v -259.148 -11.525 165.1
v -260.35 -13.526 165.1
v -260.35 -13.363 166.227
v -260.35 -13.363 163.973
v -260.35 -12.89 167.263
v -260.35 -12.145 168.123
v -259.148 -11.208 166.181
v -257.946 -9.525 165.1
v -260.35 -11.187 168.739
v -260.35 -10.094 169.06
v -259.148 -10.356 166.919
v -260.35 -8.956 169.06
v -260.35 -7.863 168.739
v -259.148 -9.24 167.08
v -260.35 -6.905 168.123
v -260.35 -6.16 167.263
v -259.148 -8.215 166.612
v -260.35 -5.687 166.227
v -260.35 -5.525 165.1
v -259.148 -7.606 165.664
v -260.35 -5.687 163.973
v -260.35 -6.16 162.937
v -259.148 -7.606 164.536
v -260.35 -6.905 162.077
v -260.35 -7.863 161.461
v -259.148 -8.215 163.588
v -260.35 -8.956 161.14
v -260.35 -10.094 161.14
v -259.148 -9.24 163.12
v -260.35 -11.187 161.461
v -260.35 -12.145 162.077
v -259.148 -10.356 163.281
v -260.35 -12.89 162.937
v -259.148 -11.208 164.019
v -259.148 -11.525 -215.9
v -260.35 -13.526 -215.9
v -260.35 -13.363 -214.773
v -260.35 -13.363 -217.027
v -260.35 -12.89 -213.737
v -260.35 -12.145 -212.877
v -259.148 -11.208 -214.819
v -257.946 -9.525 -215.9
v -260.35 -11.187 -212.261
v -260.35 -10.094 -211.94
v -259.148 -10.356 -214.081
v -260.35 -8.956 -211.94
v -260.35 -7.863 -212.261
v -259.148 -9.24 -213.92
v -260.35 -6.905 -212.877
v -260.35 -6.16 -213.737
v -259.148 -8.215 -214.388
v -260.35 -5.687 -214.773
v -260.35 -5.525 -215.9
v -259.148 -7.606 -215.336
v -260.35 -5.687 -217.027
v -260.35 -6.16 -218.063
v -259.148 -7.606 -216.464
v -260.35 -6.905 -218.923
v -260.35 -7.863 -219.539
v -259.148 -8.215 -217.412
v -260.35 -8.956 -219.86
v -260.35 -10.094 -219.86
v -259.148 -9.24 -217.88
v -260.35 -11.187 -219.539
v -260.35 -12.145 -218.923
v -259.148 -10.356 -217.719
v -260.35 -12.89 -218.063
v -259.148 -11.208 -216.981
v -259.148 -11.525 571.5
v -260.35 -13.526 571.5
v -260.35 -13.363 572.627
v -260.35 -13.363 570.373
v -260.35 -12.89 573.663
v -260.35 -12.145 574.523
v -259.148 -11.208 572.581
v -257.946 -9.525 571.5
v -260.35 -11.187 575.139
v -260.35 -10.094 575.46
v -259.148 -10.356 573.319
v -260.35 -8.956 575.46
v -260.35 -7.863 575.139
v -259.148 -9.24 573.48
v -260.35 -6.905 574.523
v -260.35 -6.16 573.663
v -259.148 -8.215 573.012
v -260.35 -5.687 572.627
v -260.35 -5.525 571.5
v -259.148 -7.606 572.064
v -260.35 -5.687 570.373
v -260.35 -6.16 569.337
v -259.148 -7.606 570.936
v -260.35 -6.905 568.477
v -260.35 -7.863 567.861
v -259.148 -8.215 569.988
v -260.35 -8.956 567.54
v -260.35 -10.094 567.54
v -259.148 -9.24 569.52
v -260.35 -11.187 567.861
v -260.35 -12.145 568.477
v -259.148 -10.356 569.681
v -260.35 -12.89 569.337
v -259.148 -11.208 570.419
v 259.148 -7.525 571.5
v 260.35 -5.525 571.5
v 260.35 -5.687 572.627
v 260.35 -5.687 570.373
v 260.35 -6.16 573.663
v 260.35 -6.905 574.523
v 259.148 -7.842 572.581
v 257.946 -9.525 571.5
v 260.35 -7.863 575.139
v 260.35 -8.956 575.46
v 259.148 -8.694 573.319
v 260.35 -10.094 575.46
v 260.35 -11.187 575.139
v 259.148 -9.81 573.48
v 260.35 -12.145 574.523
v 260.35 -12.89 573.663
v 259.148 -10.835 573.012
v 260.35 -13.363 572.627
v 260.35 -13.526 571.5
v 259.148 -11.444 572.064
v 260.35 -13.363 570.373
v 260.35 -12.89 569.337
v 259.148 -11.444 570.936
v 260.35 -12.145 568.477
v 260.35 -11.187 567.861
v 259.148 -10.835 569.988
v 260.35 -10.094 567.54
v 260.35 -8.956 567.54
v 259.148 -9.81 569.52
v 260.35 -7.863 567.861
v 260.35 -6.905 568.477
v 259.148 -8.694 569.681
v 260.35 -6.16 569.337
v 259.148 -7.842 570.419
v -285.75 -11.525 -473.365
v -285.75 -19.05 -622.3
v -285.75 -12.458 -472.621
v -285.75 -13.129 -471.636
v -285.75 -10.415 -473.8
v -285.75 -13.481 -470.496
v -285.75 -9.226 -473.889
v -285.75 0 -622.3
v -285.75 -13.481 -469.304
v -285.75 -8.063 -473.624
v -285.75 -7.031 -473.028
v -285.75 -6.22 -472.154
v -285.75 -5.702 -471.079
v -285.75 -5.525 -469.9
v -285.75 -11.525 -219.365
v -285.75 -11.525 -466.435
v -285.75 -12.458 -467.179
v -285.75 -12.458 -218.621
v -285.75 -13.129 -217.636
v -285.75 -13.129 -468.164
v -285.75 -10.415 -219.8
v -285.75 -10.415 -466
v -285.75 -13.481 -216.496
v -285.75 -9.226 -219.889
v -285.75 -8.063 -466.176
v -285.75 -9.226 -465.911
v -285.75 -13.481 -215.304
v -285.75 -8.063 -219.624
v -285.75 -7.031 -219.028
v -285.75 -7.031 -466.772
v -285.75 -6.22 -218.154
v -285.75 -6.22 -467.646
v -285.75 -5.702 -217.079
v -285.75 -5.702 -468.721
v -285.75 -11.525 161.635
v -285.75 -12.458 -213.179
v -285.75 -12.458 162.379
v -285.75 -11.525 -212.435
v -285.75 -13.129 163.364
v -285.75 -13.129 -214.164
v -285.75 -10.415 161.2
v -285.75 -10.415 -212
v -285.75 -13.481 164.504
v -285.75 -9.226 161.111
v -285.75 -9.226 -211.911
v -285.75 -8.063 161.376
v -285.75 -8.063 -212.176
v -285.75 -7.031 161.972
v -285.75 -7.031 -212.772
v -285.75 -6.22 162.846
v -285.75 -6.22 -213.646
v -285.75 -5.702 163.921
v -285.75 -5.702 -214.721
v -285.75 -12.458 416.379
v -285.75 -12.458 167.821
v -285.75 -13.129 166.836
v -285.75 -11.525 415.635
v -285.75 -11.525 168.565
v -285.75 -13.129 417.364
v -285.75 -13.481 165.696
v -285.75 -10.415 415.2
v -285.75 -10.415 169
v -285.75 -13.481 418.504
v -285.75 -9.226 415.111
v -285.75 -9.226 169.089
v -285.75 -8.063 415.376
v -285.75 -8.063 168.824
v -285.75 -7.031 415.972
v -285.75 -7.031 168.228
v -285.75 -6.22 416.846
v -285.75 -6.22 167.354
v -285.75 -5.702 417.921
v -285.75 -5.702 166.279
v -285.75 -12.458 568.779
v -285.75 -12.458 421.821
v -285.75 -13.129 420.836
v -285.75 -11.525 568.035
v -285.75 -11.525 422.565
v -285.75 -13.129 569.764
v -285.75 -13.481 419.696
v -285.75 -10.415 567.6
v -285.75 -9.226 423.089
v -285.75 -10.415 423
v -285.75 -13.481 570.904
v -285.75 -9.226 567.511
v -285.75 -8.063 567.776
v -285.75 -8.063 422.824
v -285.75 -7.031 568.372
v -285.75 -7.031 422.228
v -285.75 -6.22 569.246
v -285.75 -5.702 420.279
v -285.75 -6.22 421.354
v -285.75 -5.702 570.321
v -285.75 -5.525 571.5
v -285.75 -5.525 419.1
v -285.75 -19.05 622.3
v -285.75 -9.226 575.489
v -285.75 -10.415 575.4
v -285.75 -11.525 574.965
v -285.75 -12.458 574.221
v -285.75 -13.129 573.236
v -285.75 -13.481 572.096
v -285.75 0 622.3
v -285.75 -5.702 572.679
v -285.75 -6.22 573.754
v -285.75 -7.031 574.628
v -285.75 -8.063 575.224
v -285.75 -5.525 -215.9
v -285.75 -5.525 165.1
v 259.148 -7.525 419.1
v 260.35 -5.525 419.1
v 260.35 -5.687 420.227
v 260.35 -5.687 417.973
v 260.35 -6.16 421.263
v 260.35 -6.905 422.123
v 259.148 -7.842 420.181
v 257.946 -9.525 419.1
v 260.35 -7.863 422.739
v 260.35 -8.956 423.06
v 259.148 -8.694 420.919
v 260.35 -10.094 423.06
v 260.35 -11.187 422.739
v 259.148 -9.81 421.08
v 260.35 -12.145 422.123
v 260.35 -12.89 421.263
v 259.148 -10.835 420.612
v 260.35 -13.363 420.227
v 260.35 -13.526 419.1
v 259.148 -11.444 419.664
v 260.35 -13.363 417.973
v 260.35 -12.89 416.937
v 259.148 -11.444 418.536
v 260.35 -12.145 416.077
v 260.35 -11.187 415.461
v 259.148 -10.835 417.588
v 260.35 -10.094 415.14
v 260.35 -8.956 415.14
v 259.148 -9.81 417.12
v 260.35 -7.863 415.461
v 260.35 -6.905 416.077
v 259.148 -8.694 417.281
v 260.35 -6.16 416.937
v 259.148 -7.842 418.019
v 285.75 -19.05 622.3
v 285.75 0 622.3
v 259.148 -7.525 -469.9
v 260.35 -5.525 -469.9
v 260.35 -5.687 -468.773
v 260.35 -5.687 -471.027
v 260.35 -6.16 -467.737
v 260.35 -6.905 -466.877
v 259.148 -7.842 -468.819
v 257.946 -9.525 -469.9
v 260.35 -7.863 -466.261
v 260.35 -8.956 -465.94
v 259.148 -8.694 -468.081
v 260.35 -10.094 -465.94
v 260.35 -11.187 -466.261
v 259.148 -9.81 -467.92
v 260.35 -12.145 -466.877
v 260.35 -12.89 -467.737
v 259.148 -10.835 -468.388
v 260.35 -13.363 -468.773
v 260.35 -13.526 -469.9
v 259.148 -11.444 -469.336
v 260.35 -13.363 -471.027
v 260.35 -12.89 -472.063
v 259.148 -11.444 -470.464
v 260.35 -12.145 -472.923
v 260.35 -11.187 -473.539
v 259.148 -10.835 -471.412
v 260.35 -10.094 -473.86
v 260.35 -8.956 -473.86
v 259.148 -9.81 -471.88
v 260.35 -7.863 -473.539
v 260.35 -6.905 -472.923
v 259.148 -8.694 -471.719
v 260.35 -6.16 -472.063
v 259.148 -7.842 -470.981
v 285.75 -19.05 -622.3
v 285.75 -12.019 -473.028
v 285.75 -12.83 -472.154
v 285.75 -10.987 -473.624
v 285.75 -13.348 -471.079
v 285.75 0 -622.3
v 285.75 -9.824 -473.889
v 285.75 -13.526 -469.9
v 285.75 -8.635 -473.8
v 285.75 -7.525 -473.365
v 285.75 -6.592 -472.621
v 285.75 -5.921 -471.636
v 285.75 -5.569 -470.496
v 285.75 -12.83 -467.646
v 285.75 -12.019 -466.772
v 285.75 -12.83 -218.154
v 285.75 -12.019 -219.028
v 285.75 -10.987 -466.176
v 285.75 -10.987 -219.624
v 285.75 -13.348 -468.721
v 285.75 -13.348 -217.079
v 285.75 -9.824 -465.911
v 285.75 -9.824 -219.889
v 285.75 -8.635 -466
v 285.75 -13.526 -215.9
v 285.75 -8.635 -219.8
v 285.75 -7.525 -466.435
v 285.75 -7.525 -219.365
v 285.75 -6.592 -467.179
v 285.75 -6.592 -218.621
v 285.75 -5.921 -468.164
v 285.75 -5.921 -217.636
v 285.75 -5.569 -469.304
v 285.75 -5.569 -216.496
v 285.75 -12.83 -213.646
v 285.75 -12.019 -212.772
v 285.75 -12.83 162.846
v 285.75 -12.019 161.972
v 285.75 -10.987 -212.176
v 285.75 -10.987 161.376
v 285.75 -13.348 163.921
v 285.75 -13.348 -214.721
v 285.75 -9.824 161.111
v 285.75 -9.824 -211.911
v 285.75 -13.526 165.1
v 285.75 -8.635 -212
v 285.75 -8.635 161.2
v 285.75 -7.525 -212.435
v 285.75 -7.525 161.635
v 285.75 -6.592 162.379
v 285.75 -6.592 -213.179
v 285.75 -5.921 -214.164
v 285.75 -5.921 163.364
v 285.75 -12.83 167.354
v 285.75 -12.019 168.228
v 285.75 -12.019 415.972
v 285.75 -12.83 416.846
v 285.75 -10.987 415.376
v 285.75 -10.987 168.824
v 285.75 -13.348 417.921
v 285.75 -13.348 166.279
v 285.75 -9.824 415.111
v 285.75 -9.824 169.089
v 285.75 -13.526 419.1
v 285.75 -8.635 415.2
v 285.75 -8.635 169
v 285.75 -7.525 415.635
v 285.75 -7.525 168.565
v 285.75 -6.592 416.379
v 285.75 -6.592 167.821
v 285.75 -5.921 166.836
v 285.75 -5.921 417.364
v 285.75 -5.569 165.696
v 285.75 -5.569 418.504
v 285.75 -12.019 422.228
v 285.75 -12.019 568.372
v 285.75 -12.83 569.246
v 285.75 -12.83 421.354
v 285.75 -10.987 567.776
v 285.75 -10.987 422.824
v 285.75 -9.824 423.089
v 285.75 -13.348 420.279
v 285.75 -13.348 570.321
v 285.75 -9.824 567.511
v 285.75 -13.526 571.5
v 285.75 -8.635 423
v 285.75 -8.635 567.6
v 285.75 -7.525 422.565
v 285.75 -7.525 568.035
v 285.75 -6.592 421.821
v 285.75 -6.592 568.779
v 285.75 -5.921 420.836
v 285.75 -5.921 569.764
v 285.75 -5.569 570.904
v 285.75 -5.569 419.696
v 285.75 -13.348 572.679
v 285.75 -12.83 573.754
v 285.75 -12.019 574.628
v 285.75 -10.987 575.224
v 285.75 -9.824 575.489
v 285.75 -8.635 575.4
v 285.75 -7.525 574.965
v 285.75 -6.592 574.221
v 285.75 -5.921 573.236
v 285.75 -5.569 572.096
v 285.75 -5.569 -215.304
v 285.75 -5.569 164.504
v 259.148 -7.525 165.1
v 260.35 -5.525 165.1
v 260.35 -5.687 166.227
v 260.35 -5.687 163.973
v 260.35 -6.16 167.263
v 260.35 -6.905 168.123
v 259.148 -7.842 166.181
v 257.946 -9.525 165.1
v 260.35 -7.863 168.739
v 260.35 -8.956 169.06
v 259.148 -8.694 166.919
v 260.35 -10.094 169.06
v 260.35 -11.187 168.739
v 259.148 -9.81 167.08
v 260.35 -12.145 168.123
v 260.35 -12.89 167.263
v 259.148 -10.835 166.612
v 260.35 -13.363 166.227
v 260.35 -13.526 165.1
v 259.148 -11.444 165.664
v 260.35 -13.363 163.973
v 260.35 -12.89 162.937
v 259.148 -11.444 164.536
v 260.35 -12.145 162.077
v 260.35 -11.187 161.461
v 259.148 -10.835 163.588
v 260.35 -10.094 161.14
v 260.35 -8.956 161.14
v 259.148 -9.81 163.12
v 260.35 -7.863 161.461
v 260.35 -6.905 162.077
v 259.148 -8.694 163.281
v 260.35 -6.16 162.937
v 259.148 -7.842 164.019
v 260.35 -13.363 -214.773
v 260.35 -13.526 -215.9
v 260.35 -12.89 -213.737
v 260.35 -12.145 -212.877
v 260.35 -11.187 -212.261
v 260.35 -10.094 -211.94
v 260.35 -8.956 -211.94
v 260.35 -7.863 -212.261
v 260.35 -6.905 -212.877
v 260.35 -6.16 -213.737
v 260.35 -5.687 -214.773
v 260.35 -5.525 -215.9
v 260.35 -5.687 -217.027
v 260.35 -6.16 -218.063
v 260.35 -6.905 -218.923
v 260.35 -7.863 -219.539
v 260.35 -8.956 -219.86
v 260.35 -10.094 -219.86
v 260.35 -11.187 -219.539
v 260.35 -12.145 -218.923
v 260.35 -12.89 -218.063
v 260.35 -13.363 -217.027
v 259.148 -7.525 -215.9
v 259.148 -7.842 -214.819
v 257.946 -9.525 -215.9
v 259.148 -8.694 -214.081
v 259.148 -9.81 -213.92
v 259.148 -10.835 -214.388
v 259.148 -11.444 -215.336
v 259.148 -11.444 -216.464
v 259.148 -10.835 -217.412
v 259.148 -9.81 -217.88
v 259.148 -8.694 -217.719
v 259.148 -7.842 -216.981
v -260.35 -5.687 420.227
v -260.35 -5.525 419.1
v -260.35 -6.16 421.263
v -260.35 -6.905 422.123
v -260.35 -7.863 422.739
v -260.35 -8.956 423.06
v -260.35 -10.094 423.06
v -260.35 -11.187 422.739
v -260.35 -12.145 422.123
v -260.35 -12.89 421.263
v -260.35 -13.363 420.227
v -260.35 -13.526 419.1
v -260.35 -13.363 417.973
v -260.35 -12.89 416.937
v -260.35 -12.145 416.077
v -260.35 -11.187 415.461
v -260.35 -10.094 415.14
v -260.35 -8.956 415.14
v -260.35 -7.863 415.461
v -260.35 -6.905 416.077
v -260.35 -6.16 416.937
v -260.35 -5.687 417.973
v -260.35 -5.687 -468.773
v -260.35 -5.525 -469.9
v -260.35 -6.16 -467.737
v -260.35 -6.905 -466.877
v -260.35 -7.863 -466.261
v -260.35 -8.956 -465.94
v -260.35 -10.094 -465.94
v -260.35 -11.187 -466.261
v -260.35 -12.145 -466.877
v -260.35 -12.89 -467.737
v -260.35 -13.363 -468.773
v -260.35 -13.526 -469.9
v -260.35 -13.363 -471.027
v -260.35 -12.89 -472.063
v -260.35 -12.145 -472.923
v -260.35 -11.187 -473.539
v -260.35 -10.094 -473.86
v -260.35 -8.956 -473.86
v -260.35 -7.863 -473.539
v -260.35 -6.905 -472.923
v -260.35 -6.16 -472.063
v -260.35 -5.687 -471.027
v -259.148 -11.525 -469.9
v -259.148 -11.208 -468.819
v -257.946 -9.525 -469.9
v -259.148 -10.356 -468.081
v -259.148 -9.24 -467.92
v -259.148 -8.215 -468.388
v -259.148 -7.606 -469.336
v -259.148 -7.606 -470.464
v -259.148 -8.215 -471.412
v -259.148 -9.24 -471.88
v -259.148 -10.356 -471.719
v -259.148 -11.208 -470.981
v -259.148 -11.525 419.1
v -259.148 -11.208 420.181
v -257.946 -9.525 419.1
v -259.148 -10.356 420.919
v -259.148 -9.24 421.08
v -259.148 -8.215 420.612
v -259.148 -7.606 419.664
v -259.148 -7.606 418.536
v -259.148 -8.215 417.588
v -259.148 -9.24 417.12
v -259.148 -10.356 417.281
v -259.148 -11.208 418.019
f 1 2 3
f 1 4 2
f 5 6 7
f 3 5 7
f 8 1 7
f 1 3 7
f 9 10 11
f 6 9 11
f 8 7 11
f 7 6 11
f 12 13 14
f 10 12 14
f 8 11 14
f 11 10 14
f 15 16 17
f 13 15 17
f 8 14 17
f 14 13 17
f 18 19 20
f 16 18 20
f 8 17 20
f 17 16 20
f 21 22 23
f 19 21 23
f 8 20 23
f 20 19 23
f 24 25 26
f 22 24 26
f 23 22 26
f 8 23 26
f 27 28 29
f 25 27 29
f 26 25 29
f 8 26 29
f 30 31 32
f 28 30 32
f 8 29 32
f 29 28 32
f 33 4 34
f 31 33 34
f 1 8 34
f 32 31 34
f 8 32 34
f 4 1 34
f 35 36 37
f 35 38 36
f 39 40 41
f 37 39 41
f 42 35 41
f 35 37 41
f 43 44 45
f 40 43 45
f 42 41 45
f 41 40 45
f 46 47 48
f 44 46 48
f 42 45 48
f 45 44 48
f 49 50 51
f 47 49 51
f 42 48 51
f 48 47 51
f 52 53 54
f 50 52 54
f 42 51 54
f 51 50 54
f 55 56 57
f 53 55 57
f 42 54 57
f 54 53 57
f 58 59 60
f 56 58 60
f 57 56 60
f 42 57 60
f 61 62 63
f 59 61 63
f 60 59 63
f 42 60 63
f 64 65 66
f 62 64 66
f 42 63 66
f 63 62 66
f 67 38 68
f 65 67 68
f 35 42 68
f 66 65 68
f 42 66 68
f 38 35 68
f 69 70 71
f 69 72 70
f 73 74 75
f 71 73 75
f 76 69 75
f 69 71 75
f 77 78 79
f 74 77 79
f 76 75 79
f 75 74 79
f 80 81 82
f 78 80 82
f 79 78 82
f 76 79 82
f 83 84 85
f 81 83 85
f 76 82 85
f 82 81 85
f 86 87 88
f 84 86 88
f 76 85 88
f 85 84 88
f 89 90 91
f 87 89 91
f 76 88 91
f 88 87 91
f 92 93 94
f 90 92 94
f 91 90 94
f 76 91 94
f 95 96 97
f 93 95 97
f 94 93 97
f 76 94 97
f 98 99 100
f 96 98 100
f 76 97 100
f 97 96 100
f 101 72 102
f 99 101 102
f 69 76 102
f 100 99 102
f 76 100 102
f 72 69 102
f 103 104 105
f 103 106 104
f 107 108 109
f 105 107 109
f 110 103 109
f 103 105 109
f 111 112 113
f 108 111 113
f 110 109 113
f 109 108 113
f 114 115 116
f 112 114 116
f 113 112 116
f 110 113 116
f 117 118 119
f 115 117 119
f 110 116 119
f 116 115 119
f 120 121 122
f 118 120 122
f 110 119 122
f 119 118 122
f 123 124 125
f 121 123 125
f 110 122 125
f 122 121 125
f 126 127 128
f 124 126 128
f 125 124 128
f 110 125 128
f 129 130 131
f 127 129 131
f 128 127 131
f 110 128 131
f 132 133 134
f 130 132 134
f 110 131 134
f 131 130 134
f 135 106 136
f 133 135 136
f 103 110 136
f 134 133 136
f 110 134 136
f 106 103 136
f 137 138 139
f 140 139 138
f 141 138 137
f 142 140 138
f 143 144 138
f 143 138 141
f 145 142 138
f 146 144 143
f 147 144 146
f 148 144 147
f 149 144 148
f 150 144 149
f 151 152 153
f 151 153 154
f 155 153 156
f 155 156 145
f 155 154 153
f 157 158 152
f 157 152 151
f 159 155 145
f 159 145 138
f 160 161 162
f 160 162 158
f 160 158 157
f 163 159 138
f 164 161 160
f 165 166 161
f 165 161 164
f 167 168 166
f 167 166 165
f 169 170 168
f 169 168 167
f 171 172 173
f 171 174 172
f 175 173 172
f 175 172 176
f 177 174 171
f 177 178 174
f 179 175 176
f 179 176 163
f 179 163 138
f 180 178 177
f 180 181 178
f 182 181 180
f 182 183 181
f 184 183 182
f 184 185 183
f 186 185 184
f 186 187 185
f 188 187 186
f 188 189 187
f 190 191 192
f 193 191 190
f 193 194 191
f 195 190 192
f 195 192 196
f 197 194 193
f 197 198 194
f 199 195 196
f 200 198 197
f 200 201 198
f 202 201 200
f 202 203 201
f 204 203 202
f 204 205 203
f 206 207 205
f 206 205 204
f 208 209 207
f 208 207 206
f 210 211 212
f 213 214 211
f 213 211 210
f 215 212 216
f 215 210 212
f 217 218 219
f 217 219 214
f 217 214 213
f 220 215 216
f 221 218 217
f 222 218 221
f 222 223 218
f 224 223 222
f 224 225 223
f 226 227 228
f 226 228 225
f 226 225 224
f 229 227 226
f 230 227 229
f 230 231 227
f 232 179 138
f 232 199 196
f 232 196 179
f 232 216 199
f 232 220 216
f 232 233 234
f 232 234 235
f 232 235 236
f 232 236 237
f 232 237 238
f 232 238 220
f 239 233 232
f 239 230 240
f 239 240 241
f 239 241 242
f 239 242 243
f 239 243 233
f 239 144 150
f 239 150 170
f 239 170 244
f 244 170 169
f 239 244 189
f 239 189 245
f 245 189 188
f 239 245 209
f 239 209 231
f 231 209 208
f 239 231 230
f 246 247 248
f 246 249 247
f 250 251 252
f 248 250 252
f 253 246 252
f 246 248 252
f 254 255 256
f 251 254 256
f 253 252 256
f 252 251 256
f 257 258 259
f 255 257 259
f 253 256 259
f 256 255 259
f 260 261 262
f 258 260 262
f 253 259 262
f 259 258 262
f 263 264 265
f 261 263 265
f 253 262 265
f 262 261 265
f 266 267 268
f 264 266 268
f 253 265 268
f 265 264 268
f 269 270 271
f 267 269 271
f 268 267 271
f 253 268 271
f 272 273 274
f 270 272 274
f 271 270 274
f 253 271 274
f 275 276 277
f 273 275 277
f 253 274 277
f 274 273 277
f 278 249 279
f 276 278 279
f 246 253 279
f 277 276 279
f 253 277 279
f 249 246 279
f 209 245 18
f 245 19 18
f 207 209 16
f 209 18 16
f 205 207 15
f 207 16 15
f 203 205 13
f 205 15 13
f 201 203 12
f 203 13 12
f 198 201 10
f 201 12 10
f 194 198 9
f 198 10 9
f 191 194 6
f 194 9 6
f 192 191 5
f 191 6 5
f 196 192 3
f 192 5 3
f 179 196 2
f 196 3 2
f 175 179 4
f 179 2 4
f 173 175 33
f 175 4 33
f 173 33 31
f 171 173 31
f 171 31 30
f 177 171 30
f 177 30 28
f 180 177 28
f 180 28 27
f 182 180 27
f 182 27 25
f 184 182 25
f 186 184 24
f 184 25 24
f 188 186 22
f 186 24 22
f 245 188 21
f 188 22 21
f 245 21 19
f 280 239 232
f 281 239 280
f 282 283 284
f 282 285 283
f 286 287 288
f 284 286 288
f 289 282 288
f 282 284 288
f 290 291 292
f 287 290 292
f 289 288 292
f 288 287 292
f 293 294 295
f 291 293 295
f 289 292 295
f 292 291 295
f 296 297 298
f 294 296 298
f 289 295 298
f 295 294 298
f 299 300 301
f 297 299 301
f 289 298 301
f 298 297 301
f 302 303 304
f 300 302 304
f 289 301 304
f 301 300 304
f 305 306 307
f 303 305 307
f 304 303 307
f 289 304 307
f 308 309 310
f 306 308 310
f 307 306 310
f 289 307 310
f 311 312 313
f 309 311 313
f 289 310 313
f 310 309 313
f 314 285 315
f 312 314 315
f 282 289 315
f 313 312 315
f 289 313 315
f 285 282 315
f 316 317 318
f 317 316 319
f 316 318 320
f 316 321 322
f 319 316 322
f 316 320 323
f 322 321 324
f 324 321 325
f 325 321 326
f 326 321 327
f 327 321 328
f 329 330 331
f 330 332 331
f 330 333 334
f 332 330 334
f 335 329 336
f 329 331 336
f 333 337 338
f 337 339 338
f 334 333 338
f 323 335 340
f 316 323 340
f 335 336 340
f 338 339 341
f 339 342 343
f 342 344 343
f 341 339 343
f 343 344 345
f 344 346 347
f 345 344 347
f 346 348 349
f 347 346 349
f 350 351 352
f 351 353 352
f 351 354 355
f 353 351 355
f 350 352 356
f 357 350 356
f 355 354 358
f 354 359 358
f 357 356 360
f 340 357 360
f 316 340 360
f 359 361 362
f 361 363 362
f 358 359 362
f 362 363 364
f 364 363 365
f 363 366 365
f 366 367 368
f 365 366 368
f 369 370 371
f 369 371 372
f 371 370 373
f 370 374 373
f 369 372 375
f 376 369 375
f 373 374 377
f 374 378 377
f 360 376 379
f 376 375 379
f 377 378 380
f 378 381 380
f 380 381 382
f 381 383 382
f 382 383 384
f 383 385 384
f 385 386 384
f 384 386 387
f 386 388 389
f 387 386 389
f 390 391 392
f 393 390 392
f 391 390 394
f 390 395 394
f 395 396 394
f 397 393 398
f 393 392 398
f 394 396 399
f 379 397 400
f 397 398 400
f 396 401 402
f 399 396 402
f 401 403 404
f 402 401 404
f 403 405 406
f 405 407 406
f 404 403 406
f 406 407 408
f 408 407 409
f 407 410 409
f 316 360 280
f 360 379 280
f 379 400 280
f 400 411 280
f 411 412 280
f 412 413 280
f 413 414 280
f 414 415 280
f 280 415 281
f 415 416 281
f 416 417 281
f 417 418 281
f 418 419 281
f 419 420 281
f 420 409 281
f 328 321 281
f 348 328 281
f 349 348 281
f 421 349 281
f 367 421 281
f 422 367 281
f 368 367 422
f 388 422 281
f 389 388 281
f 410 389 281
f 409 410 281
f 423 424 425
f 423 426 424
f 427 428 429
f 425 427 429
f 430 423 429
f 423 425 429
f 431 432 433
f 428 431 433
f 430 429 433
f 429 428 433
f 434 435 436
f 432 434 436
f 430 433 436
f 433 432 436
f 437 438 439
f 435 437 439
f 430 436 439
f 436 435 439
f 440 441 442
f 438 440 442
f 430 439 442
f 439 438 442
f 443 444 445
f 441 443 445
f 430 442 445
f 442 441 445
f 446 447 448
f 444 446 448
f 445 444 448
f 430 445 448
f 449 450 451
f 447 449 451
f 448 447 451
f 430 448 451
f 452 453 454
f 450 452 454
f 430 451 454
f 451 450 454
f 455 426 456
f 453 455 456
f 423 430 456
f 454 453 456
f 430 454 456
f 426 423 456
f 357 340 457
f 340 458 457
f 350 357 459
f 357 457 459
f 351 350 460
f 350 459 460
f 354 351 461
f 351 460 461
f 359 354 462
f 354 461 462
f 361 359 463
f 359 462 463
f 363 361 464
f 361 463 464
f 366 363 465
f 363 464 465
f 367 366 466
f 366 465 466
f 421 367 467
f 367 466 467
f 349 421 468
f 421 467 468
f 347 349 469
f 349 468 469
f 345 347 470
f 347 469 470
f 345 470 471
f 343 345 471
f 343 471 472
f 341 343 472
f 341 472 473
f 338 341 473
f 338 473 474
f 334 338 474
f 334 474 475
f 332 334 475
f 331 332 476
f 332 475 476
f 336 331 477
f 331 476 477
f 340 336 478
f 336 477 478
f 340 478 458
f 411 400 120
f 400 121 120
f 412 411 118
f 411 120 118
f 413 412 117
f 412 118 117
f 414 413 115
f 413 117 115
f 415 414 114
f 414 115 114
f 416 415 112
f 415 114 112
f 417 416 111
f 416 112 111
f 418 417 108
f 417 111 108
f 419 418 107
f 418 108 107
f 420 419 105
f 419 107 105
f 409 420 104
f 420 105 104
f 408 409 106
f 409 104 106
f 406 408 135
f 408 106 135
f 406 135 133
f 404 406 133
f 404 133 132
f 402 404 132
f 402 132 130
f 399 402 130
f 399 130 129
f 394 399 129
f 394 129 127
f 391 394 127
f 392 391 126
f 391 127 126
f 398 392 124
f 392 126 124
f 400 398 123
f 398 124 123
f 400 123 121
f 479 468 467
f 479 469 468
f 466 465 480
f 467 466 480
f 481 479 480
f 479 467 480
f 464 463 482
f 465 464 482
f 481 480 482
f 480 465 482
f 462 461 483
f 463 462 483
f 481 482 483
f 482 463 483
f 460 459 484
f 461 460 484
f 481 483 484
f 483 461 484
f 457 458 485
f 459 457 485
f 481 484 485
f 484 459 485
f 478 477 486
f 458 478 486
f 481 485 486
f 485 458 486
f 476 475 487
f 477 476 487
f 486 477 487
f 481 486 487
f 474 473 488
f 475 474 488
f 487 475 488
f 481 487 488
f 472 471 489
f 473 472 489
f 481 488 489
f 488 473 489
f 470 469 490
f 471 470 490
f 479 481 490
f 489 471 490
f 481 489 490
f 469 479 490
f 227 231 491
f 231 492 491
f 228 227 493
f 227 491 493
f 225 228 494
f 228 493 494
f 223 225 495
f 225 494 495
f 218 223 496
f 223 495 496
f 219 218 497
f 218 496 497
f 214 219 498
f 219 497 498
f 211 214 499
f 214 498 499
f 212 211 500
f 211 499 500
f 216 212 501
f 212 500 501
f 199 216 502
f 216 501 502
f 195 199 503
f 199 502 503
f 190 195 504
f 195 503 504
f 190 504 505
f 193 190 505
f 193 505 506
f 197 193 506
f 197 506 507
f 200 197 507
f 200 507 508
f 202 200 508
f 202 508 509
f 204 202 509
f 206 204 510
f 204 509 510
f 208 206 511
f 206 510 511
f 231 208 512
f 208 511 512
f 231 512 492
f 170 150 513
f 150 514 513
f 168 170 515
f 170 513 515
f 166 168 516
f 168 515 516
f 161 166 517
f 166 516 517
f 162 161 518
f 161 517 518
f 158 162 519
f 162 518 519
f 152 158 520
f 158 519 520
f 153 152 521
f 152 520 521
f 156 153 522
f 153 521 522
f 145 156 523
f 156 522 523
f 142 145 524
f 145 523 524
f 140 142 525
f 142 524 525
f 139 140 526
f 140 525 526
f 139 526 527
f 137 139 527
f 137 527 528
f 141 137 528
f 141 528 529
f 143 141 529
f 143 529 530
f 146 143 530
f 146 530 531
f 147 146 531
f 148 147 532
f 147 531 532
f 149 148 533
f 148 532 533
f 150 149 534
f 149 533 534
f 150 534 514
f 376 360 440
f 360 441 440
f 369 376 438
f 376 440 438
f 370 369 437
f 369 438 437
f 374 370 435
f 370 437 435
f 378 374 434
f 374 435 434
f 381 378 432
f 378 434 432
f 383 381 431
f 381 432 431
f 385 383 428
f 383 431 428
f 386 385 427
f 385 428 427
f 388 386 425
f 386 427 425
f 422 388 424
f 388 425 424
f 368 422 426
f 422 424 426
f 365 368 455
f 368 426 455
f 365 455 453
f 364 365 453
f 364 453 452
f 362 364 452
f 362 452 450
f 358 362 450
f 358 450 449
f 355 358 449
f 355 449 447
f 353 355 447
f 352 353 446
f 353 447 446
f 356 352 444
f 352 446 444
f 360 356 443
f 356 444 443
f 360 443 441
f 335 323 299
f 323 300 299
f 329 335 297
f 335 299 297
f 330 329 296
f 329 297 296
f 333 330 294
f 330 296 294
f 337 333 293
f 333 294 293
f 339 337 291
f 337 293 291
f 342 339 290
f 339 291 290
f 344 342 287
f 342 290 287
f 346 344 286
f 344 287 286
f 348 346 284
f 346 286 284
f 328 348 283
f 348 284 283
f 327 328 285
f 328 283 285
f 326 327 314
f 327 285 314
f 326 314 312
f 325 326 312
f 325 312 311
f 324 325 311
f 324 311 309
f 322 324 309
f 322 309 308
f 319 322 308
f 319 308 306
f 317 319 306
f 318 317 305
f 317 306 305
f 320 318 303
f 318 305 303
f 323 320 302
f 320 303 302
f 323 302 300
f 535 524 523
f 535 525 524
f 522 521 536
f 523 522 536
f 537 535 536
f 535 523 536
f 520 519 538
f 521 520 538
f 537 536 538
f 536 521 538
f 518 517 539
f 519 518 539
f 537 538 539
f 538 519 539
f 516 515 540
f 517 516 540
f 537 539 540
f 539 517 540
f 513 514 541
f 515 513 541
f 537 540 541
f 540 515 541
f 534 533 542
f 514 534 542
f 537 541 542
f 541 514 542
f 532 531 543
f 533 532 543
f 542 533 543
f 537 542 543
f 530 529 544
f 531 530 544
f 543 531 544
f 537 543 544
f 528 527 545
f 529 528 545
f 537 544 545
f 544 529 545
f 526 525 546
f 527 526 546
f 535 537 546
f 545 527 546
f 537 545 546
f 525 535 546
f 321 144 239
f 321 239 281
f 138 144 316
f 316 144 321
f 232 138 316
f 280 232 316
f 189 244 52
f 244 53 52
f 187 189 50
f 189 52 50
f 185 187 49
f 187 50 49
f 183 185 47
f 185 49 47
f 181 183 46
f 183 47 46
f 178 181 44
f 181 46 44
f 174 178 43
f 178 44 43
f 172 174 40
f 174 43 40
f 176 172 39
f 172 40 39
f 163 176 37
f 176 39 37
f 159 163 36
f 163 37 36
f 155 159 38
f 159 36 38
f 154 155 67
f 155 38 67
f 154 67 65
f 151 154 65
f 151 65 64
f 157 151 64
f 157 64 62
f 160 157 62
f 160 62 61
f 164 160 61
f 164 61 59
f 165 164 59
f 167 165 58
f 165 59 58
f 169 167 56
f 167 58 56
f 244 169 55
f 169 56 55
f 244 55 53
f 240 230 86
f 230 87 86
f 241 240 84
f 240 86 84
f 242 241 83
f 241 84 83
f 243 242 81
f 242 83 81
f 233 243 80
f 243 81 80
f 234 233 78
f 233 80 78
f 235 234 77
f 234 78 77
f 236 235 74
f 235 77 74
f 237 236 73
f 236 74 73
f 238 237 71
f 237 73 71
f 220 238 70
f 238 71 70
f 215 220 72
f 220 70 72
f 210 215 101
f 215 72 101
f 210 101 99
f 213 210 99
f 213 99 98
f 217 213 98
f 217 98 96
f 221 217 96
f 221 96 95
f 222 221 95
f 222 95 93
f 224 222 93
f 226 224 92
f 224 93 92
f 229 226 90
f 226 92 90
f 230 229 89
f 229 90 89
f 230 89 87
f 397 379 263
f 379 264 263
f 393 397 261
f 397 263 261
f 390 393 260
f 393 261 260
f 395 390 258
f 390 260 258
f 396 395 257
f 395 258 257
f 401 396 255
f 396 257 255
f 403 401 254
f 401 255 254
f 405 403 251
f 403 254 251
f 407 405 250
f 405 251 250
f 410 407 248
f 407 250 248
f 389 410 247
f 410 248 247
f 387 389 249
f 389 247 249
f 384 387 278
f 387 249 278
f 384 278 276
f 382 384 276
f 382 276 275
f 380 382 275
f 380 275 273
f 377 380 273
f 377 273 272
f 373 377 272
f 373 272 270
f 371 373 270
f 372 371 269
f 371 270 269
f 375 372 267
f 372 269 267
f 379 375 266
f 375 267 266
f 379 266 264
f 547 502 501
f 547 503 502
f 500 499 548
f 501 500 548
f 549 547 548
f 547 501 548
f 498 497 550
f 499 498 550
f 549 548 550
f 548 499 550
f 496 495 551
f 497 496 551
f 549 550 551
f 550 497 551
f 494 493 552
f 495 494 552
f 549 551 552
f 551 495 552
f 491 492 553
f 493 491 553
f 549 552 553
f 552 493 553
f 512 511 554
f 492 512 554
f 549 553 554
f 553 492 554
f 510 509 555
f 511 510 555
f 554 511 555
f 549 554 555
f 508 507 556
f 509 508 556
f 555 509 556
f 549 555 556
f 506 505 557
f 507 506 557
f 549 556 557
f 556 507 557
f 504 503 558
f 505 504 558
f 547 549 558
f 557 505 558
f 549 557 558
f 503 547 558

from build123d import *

# Parameters (mm, degrees)
F0_W     = 571.5
F0_H     = 1244.6
F1_DEPTH = 19.05
F3_D     = 8.001
F3_DEPTH = 25.4
F3_TIP   = 2.4037429064
F5_D     = 8.001
F5_DEPTH = 25.4
F5_TIP   = 2.4037429064


with BuildPart() as f1:
    # F0 (on Front) → F1 (new body)
    with BuildSketch(Plane.XZ):
        Rectangle(F0_W, F0_H)
    extrude(amount=F1_DEPTH)

    # F3
    with Locations(Plane.YZ.offset(285.75)):
        with Locations((-9.525, 571.5), (-9.525, 419.1), (-9.525, 165.1), (-9.525, -215.9), (-9.525, -469.9)):
            Hole(F3_D / 2, depth=F3_DEPTH)
            with Locations((0, 0, -(F3_DEPTH + F3_TIP / 2))):  # 118° drill point
                Cone(0, F3_D / 2, F3_TIP, mode=Mode.SUBTRACT)

    # F5
    with Locations(Plane(origin=(-285.75, 0, 0), x_dir=(0, -1, 0), z_dir=(-1, 0, 0))):
        with Locations((9.525, 571.5), (9.525, 419.1), (9.525, 165.1), (9.525, -215.9), (9.525, -469.9)):
            Hole(F5_D / 2, depth=F5_DEPTH)
            with Locations((0, 0, -(F5_DEPTH + F5_TIP / 2))):  # 118° drill point
                Cone(0, F5_D / 2, F5_TIP, mode=Mode.SUBTRACT)


solid = f1.part
